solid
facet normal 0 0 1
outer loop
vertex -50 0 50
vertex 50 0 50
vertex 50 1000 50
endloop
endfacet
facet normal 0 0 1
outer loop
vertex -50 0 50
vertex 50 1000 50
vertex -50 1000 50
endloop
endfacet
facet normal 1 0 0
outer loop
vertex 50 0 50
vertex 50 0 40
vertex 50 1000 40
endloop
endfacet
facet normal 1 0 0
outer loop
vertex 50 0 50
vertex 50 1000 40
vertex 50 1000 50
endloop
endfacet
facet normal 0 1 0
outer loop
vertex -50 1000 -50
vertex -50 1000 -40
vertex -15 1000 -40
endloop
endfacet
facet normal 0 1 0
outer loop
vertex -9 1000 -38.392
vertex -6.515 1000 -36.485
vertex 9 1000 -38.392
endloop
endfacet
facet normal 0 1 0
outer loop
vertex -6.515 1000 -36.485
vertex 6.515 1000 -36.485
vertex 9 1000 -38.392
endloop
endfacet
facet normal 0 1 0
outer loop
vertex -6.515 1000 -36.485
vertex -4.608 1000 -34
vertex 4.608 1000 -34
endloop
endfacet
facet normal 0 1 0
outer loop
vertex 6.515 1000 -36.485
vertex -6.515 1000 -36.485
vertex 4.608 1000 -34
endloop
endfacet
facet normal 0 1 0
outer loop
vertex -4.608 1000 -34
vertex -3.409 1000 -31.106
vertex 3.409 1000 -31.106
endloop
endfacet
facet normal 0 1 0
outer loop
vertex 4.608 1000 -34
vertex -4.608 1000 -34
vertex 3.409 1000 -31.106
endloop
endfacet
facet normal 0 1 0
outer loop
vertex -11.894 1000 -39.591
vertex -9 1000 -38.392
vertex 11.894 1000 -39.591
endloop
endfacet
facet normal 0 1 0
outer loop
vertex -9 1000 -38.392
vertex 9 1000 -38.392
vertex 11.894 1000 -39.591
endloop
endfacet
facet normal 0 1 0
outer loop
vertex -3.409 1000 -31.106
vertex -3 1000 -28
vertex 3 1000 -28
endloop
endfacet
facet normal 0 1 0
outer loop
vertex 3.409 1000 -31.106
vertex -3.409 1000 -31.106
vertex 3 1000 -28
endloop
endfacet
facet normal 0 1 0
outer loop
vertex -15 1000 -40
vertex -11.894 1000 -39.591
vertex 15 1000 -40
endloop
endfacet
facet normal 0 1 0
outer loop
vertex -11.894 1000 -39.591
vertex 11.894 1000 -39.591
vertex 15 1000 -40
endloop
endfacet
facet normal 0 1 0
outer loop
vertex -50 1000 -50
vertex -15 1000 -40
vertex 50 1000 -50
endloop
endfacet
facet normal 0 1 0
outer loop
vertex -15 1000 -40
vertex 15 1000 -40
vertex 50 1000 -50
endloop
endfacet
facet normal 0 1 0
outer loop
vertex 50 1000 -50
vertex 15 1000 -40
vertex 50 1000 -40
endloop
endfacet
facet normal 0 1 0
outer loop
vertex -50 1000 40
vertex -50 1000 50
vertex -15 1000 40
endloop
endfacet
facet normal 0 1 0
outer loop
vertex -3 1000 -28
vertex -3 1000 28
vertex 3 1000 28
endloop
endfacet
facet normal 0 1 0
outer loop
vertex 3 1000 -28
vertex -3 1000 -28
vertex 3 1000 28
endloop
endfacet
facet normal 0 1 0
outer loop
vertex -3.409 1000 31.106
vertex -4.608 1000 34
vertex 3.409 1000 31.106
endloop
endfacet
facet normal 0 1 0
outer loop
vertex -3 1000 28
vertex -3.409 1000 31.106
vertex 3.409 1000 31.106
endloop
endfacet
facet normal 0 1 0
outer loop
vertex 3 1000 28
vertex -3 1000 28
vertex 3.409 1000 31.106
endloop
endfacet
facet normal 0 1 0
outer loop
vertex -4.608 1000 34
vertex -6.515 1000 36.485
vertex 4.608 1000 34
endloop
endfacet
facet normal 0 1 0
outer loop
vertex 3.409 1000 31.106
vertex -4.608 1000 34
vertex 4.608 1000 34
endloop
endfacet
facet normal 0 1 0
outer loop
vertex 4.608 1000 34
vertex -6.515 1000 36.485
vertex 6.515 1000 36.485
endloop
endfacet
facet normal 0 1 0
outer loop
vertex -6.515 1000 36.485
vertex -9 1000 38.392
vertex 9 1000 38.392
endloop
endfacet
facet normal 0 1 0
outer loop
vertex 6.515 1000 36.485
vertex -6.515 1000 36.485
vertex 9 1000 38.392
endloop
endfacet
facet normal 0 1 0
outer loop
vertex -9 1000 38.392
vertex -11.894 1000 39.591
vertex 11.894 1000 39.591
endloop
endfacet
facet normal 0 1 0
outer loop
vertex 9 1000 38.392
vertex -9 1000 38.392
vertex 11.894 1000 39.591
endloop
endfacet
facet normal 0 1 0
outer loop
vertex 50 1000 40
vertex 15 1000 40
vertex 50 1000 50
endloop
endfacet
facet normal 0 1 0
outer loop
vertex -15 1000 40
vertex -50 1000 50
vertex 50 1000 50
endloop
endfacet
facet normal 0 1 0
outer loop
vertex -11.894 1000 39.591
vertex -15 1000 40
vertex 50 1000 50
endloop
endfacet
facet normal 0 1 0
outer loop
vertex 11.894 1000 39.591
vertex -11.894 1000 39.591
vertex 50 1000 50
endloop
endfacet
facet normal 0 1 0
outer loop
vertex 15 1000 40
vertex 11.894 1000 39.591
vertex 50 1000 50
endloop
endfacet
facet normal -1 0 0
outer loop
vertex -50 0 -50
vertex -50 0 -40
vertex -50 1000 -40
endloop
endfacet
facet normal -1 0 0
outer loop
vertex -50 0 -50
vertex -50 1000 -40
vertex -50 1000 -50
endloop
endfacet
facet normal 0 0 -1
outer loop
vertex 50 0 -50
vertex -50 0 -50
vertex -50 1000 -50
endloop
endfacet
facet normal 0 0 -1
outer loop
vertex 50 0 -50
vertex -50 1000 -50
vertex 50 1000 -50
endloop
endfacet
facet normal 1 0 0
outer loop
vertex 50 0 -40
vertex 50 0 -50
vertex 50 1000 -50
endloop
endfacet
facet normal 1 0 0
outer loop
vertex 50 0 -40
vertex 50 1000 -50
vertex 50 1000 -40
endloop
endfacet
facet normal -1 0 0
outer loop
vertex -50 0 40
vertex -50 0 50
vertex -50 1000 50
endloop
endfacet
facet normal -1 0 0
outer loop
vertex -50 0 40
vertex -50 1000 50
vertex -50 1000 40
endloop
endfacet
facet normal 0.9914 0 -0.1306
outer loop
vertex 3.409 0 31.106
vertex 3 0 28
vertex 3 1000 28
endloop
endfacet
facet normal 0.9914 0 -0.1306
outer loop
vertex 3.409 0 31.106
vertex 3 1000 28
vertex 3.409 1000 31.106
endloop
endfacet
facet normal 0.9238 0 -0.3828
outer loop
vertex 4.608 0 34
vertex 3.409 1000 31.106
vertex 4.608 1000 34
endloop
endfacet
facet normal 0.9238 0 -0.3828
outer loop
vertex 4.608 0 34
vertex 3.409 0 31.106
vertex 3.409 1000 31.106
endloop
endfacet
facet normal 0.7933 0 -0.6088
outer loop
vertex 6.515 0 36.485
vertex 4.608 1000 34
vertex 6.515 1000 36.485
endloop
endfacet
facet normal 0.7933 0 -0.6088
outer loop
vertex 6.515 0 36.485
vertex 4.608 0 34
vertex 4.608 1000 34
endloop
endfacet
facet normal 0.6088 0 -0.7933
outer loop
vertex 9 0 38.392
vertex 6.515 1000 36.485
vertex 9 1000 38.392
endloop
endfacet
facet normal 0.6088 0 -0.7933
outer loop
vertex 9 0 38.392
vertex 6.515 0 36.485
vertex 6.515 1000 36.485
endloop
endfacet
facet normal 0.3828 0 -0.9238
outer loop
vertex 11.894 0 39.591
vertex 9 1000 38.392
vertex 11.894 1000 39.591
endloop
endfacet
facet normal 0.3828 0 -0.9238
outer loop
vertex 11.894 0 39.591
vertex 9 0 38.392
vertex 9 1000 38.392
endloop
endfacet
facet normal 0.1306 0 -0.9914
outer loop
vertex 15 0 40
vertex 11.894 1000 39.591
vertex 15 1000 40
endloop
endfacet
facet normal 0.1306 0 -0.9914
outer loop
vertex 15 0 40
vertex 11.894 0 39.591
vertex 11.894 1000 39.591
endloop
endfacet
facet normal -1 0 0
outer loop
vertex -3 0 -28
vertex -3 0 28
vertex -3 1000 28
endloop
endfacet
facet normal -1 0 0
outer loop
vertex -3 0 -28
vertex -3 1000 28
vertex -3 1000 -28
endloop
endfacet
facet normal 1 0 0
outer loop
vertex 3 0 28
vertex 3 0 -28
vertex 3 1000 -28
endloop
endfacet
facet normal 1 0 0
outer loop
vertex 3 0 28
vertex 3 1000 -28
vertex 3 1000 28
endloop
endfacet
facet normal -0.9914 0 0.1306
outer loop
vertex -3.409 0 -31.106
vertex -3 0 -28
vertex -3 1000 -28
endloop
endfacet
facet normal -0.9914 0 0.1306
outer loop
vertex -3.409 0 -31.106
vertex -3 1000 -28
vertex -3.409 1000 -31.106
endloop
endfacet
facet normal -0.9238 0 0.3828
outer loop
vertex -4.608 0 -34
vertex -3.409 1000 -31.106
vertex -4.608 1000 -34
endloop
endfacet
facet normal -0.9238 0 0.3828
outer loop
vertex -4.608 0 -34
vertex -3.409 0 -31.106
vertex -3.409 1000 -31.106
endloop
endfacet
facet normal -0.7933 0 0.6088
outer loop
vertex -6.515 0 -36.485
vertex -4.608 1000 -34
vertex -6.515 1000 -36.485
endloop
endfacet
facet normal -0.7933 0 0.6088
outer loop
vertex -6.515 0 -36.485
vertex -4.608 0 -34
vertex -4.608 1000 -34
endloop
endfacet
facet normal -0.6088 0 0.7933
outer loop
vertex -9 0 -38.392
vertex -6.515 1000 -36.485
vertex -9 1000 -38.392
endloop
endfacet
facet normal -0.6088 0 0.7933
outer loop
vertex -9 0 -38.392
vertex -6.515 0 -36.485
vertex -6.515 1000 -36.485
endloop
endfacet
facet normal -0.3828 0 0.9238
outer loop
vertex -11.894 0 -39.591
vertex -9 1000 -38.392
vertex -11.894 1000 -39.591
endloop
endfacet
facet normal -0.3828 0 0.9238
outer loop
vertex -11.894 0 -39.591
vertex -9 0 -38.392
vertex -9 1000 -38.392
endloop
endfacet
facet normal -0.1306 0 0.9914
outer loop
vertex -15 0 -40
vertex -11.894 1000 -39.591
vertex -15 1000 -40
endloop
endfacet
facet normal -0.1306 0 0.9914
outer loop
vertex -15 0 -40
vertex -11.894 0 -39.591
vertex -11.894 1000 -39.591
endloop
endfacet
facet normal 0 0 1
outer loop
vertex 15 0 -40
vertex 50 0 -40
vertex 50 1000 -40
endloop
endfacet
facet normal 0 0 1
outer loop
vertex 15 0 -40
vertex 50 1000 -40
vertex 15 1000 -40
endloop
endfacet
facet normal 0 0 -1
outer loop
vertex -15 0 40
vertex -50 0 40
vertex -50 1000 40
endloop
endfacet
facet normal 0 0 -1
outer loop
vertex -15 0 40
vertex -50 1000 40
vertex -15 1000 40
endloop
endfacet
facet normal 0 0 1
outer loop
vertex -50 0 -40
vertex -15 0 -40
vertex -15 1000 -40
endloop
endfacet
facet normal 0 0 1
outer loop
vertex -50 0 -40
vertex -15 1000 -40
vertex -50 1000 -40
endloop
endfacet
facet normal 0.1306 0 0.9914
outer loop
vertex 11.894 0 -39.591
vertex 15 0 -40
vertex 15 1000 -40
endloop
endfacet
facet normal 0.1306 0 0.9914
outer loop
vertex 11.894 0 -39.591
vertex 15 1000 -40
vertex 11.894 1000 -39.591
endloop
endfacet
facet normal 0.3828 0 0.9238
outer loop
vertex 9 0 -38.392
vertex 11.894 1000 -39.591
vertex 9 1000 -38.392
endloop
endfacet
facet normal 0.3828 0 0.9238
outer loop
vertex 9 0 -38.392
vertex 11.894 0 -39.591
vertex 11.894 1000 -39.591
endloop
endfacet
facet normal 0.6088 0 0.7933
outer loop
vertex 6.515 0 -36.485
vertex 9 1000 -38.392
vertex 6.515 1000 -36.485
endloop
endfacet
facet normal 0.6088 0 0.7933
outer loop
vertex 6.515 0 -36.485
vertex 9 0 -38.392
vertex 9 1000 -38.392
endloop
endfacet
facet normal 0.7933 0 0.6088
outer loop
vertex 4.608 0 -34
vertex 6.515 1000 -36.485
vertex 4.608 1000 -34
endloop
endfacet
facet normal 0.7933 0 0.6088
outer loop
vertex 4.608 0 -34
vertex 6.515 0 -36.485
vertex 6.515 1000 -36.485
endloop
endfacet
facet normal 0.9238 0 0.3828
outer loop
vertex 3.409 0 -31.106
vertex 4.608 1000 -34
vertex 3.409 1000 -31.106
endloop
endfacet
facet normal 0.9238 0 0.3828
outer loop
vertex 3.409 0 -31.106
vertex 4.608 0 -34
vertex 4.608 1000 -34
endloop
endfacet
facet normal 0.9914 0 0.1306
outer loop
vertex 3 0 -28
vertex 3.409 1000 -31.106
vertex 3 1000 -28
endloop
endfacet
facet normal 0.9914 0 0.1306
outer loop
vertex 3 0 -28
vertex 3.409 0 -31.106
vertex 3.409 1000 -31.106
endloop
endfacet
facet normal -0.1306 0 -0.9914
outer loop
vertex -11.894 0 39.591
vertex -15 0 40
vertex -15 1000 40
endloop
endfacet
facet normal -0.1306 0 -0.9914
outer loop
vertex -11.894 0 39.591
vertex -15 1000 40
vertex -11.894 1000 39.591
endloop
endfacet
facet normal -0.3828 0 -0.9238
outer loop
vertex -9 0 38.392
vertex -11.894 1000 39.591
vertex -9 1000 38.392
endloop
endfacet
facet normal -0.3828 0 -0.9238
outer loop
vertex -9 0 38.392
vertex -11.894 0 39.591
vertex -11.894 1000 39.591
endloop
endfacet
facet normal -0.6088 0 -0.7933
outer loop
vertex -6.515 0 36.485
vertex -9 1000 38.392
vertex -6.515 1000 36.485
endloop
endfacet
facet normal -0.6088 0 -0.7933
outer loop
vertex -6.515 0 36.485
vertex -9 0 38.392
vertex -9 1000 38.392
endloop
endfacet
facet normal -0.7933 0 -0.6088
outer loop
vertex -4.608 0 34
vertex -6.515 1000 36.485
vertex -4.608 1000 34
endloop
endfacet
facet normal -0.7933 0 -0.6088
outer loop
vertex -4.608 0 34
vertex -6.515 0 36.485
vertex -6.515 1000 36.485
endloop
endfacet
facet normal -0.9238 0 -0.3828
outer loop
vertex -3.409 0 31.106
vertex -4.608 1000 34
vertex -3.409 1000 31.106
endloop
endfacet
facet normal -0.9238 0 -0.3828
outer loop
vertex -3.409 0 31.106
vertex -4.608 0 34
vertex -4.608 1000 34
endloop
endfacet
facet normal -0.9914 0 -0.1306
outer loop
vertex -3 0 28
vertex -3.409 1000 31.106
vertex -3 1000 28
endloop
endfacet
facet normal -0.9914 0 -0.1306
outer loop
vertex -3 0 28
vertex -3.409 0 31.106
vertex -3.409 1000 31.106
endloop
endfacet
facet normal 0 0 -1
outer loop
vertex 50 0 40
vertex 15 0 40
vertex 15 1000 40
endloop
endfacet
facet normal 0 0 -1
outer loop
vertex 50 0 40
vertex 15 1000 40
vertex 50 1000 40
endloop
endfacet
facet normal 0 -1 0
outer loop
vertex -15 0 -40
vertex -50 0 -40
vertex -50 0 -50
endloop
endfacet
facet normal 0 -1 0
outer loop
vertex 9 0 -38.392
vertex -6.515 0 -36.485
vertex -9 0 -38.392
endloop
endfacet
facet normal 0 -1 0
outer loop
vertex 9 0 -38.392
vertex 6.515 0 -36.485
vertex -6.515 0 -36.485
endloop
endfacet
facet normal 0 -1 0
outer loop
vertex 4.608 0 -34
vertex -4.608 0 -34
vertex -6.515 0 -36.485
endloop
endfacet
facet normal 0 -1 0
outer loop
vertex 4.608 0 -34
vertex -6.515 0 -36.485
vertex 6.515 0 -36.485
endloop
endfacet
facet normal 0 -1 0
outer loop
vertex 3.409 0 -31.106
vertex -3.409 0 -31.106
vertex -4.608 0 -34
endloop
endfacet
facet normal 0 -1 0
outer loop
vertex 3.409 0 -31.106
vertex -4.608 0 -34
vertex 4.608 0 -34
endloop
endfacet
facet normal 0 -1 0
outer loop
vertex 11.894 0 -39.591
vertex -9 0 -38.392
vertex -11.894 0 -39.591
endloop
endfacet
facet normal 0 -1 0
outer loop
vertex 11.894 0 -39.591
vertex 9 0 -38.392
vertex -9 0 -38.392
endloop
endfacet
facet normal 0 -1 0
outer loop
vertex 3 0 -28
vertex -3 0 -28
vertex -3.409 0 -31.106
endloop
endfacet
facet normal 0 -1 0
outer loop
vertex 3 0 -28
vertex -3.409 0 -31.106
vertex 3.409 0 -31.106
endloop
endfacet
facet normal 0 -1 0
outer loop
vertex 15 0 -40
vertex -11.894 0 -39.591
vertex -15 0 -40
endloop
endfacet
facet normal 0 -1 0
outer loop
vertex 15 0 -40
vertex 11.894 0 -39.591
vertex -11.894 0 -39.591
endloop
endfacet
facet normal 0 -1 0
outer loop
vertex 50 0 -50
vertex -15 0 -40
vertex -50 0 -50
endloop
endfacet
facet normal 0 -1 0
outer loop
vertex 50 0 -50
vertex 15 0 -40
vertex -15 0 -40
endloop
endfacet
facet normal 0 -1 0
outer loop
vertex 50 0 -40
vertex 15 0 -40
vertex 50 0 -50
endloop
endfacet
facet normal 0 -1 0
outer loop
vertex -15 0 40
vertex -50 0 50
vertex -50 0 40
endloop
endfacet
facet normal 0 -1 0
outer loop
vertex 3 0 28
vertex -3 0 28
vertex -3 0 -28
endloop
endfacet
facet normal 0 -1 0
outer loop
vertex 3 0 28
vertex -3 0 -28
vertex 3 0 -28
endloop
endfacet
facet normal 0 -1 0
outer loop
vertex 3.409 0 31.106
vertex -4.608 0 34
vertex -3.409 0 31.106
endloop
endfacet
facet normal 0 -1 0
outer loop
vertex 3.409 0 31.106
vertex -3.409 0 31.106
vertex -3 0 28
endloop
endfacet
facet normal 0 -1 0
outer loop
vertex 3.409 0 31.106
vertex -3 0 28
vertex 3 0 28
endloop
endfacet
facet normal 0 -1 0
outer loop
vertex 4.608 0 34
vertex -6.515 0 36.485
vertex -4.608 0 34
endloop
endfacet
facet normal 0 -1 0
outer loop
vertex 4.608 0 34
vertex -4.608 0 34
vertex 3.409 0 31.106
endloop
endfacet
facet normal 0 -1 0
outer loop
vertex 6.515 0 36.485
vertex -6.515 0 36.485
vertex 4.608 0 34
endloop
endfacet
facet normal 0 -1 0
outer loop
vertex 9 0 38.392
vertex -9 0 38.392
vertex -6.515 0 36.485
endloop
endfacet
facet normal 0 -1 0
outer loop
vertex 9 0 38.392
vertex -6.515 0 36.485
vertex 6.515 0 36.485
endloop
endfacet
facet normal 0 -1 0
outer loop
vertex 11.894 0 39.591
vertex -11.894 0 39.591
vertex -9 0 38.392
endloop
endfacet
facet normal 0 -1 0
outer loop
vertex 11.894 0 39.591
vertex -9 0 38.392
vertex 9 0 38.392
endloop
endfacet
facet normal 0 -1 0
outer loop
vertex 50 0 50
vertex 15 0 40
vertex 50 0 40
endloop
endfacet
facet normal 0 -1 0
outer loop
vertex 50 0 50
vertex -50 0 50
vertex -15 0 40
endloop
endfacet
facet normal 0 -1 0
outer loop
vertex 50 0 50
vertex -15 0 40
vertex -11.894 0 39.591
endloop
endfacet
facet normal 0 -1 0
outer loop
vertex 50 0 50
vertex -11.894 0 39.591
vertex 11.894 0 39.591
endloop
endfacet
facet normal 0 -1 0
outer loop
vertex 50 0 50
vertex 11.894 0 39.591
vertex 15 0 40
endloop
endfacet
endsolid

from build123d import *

# Parameters (mm, degrees)
F1_DEPTH = 1000


with BuildPart() as f1:
    # F0 (on Front) → F1 (new body)
    with BuildSketch(Plane.XZ):
        with BuildLine():
            Line((50, -50), (50, -40))
            Line((50, -40), (15, -40))
            ThreePointArc((15, -40), (6.514719, -36.485281), (3, -28))
            Line((3, -28), (3, 0))
            Line((3, 0), (3, 28))
            ThreePointArc((3, 28), (6.514719, 36.485281), (15, 40))
            Line((15, 40), (50, 40))
            Line((50, 40), (50, 50))
            Line((50, 50), (0, 50))
            Line((0, 50), (-50, 50))
            Line((-50, 50), (-50, 40))
            Line((-50, 40), (-15, 40))
            ThreePointArc((-15, 40), (-6.514719, 36.485281), (-3, 28))
            Line((-3, 28), (-3, 0))
            Line((-3, 0), (-3, -28))
            ThreePointArc((-3, -28), (-6.514719, -36.485281), (-15, -40))
            Line((-15, -40), (-50, -40))
            Line((-50, -40), (-50, -50))
            Line((-50, -50), (0, -50))
            Line((0, -50), (50, -50))
        make_face()
    extrude(amount=-F1_DEPTH)


solid = f1.part
